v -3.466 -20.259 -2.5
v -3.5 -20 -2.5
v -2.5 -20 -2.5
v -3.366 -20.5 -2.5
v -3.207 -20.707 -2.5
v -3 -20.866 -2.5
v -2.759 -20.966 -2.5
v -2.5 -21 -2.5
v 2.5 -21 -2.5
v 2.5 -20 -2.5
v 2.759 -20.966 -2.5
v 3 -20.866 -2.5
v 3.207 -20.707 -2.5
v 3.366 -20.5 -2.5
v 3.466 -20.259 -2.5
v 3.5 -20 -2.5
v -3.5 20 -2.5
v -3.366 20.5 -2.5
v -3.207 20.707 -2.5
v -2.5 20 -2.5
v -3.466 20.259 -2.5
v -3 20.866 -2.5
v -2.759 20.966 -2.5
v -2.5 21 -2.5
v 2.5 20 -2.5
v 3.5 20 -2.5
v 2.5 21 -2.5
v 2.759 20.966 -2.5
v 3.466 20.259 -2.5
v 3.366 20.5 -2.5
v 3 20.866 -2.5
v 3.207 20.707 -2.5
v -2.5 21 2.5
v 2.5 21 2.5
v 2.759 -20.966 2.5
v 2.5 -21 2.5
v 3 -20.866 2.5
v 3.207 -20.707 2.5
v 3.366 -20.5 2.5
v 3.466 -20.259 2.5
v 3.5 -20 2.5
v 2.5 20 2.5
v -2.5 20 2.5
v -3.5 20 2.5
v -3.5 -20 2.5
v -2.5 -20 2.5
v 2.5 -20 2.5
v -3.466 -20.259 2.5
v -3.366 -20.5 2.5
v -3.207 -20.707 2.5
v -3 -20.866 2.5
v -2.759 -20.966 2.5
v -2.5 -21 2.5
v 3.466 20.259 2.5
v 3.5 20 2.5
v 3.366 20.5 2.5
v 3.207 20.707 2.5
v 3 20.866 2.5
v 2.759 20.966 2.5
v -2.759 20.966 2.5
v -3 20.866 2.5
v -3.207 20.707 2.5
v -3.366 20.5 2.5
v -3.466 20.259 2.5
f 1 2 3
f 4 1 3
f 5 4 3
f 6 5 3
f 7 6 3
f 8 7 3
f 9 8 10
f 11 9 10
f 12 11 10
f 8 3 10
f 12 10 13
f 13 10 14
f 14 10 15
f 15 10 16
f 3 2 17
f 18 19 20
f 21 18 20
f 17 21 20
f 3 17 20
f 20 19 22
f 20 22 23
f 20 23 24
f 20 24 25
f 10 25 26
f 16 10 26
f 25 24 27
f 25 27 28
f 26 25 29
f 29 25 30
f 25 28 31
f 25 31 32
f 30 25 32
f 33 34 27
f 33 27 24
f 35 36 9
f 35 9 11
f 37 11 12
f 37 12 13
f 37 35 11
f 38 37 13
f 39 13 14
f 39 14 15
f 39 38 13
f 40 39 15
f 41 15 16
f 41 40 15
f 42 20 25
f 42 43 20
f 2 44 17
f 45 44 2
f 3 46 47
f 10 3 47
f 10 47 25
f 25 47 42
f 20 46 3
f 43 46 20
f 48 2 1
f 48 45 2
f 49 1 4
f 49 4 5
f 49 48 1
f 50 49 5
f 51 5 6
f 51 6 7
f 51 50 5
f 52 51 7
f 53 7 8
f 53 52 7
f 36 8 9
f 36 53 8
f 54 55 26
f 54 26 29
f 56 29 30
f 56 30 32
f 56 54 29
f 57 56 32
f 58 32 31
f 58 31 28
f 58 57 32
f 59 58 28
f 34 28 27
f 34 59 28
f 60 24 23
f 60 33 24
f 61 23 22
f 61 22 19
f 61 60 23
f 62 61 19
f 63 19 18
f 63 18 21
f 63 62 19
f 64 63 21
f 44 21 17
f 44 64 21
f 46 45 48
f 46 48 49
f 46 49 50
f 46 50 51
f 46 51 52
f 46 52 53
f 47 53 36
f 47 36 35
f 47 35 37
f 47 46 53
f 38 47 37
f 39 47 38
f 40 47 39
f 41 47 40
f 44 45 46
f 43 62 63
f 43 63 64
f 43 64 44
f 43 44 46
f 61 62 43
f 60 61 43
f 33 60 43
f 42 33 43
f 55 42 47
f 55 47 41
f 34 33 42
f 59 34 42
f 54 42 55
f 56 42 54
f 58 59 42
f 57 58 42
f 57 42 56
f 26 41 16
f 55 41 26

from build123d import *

# Parameters (mm, degrees)
F0_W     = 5
F0_H     = 40
F1_DEPTH = 2.5


with BuildPart() as f1:
    # F0 (on Top) → F1 (new body, symmetric)
    with BuildSketch(Plane.XY):
        with BuildLine():
            Line((-2.5, -21), (2.5, -21))
            ThreePointArc((2.5, -21), (3.207107, -20.707107), (3.5, -20))
            Line((3.5, -20), (3.5, 20))
            ThreePointArc((3.5, 20), (3.207107, 20.707107), (2.5, 21))
            Line((2.5, 21), (-2.5, 21))
            ThreePointArc((-2.5, 21), (-3.207107, 20.707107), (-3.5, 20))
            Line((-3.5, 20), (-3.5, -20))
            ThreePointArc((-3.5, -20), (-3.207107, -20.707107), (-2.5, -21))
        make_face()
        Rectangle(F0_W, F0_H, mode=Mode.SUBTRACT)
    extrude(amount=F1_DEPTH, both=True)


solid = f1.part
